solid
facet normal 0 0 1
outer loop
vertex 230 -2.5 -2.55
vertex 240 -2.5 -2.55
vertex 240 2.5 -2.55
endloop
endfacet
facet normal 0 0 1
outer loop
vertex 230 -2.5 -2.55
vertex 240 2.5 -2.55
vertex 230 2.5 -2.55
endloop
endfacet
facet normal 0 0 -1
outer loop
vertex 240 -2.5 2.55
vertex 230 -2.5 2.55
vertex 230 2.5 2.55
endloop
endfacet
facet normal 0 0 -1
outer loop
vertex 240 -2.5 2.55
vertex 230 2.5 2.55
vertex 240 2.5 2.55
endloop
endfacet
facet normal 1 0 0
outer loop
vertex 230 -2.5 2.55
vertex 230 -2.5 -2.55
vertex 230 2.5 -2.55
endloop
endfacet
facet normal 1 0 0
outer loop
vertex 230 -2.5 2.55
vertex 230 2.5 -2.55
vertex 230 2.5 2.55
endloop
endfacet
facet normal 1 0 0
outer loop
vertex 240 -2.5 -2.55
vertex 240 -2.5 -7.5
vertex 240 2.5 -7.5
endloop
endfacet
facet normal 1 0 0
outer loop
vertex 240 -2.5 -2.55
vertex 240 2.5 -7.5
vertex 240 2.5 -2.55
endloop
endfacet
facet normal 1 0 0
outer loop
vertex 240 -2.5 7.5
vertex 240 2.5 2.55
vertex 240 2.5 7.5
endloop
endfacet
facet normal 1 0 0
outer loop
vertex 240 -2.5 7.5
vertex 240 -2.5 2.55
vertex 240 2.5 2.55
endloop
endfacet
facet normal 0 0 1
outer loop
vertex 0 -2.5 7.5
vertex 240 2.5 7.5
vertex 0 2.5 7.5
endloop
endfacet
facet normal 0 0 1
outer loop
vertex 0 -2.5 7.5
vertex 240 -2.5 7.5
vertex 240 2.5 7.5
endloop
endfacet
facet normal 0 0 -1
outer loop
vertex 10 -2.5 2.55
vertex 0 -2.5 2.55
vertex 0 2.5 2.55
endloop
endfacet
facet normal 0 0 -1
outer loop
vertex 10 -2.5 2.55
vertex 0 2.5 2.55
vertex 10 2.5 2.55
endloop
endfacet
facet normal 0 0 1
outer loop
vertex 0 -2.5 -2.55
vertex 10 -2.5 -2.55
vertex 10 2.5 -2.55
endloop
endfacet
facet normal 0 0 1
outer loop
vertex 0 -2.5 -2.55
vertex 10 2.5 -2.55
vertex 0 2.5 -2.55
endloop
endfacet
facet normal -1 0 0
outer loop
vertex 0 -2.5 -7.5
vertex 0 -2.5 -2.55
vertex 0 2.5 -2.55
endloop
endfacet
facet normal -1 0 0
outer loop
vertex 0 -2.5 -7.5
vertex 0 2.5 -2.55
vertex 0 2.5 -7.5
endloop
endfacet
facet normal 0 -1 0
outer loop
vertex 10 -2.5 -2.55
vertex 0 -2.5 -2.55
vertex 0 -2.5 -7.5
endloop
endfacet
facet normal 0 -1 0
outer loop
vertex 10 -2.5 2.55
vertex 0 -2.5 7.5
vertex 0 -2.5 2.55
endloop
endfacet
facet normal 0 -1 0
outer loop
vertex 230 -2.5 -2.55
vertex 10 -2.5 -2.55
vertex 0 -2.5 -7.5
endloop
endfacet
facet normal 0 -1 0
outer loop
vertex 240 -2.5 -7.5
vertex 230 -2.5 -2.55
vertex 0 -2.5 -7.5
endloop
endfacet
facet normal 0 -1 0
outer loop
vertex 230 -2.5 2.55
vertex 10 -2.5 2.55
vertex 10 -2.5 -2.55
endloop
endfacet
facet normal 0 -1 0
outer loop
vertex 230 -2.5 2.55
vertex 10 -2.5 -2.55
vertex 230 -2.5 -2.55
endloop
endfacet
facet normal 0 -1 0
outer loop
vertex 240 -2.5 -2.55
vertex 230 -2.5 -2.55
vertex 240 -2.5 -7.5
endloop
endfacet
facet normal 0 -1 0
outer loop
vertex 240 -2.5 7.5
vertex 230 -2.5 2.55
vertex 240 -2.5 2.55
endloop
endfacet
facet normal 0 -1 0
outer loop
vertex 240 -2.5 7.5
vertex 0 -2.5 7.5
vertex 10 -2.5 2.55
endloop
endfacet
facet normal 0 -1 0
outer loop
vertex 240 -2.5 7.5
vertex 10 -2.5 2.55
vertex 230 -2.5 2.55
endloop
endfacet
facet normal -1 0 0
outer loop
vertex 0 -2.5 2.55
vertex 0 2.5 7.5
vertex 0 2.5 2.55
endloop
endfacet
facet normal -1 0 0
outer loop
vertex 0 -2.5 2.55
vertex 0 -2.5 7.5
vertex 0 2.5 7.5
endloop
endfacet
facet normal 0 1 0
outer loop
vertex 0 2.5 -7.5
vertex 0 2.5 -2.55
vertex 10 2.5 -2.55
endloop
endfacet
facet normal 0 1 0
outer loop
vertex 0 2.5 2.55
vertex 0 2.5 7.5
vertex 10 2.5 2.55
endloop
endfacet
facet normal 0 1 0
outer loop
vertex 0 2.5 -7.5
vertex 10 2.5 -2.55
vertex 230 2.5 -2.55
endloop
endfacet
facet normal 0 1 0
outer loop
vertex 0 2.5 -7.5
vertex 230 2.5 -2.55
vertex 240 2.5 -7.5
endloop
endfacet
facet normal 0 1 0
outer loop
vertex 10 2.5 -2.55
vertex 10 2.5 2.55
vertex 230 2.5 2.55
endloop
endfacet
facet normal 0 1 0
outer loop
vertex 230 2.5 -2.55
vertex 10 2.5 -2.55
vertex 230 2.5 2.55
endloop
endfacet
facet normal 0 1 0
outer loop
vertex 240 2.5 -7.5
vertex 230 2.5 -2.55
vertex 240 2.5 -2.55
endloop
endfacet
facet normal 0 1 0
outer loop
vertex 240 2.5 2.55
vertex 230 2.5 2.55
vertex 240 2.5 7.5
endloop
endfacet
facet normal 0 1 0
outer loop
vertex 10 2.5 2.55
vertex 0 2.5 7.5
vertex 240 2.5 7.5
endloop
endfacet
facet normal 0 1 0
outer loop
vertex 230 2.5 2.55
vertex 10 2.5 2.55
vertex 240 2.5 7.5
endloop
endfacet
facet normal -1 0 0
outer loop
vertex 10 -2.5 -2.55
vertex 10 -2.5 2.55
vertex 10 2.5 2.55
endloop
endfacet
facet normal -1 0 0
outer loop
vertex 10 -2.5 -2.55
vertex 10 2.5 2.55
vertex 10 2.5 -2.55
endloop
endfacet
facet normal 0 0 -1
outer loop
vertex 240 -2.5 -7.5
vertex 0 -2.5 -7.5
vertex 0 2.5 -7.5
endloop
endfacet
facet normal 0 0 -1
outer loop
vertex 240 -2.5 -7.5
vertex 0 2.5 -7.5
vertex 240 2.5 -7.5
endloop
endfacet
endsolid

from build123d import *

# Parameters (mm, degrees)
PAD_DEPTH = 2.5


with BuildPart() as part:
    # Sketch → Pad (new body, symmetric)
    with BuildSketch(Plane.XZ):
        Polygon((0, 7.5), (0, 2.55), (10, 2.55), (10, -2.55), (0, -2.55), (0, -7.5), (240, -7.5), (240, -2.55), (230, -2.55), (230, 2.55), (240, 2.55), (240, 7.5), align=None)
    extrude(amount=PAD_DEPTH, both=True)


solid = part.part
